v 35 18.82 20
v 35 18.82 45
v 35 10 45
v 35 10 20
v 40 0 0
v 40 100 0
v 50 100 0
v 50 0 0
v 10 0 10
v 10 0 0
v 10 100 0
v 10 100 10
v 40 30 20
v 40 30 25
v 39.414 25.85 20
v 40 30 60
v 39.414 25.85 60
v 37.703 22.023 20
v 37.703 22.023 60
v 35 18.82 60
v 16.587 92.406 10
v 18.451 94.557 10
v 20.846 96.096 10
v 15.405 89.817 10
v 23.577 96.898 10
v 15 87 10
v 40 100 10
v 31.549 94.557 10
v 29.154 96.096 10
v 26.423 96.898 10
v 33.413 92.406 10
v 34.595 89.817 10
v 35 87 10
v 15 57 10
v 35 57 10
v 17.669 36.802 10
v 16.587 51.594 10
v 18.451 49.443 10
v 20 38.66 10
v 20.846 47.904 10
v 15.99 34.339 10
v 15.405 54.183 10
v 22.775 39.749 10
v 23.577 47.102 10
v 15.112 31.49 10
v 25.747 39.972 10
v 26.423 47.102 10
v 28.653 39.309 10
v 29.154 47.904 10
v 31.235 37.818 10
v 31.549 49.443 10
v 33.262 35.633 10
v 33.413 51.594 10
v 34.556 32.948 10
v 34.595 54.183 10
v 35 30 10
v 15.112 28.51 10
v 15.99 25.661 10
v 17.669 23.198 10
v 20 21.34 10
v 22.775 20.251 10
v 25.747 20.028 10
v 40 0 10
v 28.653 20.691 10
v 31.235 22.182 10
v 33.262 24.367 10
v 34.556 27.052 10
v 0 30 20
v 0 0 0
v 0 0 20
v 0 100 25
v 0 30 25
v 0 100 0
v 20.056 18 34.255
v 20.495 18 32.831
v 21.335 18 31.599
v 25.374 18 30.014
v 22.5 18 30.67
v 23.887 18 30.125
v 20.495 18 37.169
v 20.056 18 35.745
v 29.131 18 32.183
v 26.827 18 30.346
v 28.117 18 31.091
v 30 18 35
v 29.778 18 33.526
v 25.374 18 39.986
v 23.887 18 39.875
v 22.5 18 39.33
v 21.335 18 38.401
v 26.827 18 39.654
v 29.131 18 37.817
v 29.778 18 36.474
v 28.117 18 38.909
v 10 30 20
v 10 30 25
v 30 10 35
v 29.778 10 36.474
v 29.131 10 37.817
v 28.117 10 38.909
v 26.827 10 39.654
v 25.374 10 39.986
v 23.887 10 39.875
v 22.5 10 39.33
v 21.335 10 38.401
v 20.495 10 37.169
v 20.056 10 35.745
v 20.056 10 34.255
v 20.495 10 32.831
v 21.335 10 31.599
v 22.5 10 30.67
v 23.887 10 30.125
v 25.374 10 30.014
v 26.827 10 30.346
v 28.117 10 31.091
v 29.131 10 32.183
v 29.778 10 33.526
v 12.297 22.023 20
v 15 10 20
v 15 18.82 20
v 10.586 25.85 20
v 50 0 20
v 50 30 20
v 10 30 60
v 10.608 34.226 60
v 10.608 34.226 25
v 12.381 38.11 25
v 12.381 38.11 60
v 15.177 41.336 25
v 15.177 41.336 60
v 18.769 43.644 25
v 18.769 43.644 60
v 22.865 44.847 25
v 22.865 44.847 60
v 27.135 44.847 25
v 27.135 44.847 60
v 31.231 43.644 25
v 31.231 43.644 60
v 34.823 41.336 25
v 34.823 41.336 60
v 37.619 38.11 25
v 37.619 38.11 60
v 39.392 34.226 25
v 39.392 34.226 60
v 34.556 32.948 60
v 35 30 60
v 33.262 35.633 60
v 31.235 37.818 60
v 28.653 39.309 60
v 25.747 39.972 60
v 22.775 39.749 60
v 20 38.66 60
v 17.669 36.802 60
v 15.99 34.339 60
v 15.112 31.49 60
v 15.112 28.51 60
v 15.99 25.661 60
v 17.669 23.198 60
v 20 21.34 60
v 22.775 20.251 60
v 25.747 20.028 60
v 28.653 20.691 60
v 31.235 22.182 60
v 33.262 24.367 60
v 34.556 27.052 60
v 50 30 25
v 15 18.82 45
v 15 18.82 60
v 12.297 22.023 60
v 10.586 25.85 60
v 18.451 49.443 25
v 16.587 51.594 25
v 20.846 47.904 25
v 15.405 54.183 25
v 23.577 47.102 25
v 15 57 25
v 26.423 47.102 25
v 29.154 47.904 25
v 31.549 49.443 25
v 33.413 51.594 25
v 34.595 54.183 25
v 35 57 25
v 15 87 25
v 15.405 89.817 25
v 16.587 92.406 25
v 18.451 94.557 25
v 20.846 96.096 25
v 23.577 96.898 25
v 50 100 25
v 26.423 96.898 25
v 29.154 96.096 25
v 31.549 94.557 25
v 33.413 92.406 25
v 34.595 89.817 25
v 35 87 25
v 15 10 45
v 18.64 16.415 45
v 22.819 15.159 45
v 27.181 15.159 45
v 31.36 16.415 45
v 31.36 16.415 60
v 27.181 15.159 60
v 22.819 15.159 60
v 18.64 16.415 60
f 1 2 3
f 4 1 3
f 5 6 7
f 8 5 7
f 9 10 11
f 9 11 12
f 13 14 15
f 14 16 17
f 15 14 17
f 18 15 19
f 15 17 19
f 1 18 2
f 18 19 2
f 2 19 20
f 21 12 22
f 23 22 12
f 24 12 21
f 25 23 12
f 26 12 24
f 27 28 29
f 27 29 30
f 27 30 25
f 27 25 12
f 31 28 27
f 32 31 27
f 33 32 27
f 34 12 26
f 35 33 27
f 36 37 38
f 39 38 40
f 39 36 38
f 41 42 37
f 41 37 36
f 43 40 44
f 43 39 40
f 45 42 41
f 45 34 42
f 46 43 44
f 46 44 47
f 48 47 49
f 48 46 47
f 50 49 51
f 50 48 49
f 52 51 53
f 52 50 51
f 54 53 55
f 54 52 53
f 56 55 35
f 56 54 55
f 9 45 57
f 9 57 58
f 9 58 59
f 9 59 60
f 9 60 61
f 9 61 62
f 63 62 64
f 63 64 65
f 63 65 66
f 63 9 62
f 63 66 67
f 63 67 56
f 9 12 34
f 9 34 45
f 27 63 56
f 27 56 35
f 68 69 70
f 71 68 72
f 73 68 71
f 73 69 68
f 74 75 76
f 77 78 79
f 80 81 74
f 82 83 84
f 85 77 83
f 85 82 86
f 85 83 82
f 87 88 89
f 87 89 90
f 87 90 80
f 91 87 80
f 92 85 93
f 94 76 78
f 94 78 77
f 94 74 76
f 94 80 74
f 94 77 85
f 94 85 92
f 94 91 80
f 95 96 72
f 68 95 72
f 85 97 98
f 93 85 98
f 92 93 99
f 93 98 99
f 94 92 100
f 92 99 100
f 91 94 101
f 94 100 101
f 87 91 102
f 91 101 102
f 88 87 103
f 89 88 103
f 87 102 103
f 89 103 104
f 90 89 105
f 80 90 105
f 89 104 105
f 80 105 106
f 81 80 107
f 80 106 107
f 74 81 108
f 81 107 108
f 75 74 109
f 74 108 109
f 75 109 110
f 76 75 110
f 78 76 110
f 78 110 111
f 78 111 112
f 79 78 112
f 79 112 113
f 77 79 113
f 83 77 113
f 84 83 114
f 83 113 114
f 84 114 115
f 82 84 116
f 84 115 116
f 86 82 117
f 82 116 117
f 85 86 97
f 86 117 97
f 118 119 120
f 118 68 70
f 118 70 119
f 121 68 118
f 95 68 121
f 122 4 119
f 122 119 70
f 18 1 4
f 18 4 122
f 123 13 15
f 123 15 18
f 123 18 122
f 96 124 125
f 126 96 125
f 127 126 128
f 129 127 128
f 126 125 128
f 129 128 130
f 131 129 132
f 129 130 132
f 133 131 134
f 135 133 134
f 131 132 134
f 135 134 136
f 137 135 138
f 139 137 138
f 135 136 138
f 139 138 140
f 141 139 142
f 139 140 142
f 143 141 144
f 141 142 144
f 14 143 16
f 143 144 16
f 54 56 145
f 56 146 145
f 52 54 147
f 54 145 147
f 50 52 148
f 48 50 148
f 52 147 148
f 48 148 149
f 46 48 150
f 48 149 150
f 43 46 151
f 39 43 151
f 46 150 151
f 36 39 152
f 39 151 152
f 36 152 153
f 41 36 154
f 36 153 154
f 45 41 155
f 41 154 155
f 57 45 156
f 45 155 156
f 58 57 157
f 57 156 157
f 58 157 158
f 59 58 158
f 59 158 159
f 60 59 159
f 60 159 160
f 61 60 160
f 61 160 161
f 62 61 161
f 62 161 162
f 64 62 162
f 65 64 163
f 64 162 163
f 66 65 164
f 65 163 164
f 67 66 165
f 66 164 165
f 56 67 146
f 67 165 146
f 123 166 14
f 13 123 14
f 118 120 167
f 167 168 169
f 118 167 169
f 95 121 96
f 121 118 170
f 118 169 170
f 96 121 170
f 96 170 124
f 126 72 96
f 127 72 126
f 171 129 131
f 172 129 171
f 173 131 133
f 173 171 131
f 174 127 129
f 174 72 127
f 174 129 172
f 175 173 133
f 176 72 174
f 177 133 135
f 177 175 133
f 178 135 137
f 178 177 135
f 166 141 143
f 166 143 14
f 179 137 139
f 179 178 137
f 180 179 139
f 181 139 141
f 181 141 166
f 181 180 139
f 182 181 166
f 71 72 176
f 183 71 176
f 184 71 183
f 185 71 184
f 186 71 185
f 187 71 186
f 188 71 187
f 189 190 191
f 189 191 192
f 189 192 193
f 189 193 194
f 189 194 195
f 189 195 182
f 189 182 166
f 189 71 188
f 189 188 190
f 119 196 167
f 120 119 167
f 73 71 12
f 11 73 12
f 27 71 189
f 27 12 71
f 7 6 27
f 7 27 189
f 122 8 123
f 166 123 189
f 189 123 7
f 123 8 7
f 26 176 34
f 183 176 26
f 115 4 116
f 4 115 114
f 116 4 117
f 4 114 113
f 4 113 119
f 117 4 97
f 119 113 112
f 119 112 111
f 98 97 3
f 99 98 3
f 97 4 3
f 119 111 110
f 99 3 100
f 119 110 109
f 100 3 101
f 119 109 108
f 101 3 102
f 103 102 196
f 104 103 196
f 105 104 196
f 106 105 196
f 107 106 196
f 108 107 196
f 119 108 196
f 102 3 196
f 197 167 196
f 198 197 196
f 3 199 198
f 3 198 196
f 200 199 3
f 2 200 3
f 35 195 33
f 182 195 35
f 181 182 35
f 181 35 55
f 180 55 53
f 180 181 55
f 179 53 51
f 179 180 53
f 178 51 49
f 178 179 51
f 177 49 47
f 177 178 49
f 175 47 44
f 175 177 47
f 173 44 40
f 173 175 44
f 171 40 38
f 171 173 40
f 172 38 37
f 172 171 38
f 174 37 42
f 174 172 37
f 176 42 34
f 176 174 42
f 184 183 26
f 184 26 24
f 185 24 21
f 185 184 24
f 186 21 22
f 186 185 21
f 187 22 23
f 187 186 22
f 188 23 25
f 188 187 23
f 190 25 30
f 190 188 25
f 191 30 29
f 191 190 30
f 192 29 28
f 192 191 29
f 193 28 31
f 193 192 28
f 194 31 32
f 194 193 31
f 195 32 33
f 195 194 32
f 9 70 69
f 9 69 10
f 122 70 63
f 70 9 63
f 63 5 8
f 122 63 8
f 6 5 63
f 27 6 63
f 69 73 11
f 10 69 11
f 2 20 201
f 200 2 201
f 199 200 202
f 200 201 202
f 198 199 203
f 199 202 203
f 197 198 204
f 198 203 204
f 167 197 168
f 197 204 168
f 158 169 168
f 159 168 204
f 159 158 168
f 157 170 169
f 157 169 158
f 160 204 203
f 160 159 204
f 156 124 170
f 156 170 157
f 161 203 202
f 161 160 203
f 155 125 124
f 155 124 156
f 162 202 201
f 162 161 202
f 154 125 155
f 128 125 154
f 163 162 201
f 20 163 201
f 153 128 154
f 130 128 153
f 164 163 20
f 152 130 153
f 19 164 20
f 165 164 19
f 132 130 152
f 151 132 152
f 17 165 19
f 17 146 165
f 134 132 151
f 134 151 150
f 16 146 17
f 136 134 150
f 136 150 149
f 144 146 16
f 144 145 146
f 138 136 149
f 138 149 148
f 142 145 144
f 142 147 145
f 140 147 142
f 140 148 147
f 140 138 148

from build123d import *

# Parameters (mm, degrees)
IZIM1_W                     = 50
IZIM1_H                     = 100
Y_KSEKLIK_EKSTR_ZYON1_DEPTH = 60
IZIM2_R                     = 10
KES_EKSTR_ZYON2_DEPTH       = 35
IZIM3_R                     = 10
KES_EKSTR_ZYON3_DEPTH       = 35
KES_EKSTR_ZYON4_DEPTH       = 40
KES_EKSTR_ZYON5_DEPTH       = 15
IZIM7_R                     = 5
KES_EKSTR_ZYON6_DEPTH       = 8
IZIM8_W                     = 30
IZIM8_H                     = 10
KES_EKSTR_ZYON7_DEPTH       = 101


with BuildPart() as part:
    # Çizim1 → Yükseklik-Ekstrüzyon1 (new body)
    with BuildSketch(Plane.XY):
        with Locations((25, 50)):
            Rectangle(IZIM1_W, IZIM1_H)
    extrude(amount=Y_KSEKLIK_EKSTR_ZYON1_DEPTH)

    # Çizim2 → Kes-Ekstrüzyon2 (cut)
    with BuildSketch(Plane.XY.offset(60)):
        with BuildLine():
            Line((0, 100), (0, 30))
            Line((0, 30), (10, 30))
            ThreePointArc((10, 30), (25, 45), (40, 30))
            Line((40, 30), (50, 30))
            Line((50, 30), (50, 100))
            Line((50, 100), (0, 100))
        make_face()
        with Locations((25, 30)):
            Circle(IZIM2_R)
    extrude(amount=-KES_EKSTR_ZYON2_DEPTH, mode=Mode.SUBTRACT)

    # Çizim3 → Kes-Ekstrüzyon3 (cut)
    with BuildSketch(Plane.XY.offset(25)):
        with Locations((25, 30)):
            Circle(IZIM3_R)
        with BuildLine():
            Line((15, 57), (15, 87))
            ThreePointArc((15, 87), (25, 97), (35, 87))
            Line((35, 87), (35, 57))
            ThreePointArc((35, 57), (25, 47), (15, 57))
        make_face()
    extrude(amount=-KES_EKSTR_ZYON3_DEPTH, mode=Mode.SUBTRACT)

    # Çizim5 → Kes-Ekstrüzyon4 (cut)
    with BuildSketch(Plane.XY.offset(60)):
        with BuildLine():
            Line((35, 10), (15, 10))
            Line((15, 10), (15, 18.819660113))
            ThreePointArc((15, 18.819660113), (11.306936062, 23.876275643), (10, 30))
            Line((10, 30), (0, 30))
            Line((0, 30), (0, 0))
            Line((0, 0), (50, 0))
            Line((50, 0), (50, 30))
            Line((50, 30), (40, 30))
            ThreePointArc((40, 30), (38.693063938, 23.876275643), (35, 18.819660113))
            Line((35, 18.819660113), (35, 10))
        make_face()
    extrude(amount=-KES_EKSTR_ZYON4_DEPTH, mode=Mode.SUBTRACT)

    # Çizim6 → Kes-Ekstrüzyon5 (cut)
    with BuildSketch(Plane.XY.offset(60)):
        with BuildLine():
            Line((15, 18.819660113), (15, 10))
            Line((15, 10), (35, 10))
            Line((35, 10), (35, 18.819660113))
            ThreePointArc((35, 18.819660113), (25, 15), (15, 18.819660113))
        make_face()
    extrude(amount=-KES_EKSTR_ZYON5_DEPTH, mode=Mode.SUBTRACT)

    # Çizim7 → Kes-Ekstrüzyon6 (cut)
    with BuildSketch(Plane.XZ.offset(-10)):
        with Locations((25, 35)):
            Circle(IZIM7_R)
    extrude(amount=-KES_EKSTR_ZYON6_DEPTH, mode=Mode.SUBTRACT)

    # Çizim8 → Kes-Ekstrüzyon7 (cut, through all)
    with BuildSketch(Plane.XZ):
        with Locations((25, 5)):
            Rectangle(IZIM8_W, IZIM8_H)
    extrude(amount=-KES_EKSTR_ZYON7_DEPTH, mode=Mode.SUBTRACT)


solid = part.part
